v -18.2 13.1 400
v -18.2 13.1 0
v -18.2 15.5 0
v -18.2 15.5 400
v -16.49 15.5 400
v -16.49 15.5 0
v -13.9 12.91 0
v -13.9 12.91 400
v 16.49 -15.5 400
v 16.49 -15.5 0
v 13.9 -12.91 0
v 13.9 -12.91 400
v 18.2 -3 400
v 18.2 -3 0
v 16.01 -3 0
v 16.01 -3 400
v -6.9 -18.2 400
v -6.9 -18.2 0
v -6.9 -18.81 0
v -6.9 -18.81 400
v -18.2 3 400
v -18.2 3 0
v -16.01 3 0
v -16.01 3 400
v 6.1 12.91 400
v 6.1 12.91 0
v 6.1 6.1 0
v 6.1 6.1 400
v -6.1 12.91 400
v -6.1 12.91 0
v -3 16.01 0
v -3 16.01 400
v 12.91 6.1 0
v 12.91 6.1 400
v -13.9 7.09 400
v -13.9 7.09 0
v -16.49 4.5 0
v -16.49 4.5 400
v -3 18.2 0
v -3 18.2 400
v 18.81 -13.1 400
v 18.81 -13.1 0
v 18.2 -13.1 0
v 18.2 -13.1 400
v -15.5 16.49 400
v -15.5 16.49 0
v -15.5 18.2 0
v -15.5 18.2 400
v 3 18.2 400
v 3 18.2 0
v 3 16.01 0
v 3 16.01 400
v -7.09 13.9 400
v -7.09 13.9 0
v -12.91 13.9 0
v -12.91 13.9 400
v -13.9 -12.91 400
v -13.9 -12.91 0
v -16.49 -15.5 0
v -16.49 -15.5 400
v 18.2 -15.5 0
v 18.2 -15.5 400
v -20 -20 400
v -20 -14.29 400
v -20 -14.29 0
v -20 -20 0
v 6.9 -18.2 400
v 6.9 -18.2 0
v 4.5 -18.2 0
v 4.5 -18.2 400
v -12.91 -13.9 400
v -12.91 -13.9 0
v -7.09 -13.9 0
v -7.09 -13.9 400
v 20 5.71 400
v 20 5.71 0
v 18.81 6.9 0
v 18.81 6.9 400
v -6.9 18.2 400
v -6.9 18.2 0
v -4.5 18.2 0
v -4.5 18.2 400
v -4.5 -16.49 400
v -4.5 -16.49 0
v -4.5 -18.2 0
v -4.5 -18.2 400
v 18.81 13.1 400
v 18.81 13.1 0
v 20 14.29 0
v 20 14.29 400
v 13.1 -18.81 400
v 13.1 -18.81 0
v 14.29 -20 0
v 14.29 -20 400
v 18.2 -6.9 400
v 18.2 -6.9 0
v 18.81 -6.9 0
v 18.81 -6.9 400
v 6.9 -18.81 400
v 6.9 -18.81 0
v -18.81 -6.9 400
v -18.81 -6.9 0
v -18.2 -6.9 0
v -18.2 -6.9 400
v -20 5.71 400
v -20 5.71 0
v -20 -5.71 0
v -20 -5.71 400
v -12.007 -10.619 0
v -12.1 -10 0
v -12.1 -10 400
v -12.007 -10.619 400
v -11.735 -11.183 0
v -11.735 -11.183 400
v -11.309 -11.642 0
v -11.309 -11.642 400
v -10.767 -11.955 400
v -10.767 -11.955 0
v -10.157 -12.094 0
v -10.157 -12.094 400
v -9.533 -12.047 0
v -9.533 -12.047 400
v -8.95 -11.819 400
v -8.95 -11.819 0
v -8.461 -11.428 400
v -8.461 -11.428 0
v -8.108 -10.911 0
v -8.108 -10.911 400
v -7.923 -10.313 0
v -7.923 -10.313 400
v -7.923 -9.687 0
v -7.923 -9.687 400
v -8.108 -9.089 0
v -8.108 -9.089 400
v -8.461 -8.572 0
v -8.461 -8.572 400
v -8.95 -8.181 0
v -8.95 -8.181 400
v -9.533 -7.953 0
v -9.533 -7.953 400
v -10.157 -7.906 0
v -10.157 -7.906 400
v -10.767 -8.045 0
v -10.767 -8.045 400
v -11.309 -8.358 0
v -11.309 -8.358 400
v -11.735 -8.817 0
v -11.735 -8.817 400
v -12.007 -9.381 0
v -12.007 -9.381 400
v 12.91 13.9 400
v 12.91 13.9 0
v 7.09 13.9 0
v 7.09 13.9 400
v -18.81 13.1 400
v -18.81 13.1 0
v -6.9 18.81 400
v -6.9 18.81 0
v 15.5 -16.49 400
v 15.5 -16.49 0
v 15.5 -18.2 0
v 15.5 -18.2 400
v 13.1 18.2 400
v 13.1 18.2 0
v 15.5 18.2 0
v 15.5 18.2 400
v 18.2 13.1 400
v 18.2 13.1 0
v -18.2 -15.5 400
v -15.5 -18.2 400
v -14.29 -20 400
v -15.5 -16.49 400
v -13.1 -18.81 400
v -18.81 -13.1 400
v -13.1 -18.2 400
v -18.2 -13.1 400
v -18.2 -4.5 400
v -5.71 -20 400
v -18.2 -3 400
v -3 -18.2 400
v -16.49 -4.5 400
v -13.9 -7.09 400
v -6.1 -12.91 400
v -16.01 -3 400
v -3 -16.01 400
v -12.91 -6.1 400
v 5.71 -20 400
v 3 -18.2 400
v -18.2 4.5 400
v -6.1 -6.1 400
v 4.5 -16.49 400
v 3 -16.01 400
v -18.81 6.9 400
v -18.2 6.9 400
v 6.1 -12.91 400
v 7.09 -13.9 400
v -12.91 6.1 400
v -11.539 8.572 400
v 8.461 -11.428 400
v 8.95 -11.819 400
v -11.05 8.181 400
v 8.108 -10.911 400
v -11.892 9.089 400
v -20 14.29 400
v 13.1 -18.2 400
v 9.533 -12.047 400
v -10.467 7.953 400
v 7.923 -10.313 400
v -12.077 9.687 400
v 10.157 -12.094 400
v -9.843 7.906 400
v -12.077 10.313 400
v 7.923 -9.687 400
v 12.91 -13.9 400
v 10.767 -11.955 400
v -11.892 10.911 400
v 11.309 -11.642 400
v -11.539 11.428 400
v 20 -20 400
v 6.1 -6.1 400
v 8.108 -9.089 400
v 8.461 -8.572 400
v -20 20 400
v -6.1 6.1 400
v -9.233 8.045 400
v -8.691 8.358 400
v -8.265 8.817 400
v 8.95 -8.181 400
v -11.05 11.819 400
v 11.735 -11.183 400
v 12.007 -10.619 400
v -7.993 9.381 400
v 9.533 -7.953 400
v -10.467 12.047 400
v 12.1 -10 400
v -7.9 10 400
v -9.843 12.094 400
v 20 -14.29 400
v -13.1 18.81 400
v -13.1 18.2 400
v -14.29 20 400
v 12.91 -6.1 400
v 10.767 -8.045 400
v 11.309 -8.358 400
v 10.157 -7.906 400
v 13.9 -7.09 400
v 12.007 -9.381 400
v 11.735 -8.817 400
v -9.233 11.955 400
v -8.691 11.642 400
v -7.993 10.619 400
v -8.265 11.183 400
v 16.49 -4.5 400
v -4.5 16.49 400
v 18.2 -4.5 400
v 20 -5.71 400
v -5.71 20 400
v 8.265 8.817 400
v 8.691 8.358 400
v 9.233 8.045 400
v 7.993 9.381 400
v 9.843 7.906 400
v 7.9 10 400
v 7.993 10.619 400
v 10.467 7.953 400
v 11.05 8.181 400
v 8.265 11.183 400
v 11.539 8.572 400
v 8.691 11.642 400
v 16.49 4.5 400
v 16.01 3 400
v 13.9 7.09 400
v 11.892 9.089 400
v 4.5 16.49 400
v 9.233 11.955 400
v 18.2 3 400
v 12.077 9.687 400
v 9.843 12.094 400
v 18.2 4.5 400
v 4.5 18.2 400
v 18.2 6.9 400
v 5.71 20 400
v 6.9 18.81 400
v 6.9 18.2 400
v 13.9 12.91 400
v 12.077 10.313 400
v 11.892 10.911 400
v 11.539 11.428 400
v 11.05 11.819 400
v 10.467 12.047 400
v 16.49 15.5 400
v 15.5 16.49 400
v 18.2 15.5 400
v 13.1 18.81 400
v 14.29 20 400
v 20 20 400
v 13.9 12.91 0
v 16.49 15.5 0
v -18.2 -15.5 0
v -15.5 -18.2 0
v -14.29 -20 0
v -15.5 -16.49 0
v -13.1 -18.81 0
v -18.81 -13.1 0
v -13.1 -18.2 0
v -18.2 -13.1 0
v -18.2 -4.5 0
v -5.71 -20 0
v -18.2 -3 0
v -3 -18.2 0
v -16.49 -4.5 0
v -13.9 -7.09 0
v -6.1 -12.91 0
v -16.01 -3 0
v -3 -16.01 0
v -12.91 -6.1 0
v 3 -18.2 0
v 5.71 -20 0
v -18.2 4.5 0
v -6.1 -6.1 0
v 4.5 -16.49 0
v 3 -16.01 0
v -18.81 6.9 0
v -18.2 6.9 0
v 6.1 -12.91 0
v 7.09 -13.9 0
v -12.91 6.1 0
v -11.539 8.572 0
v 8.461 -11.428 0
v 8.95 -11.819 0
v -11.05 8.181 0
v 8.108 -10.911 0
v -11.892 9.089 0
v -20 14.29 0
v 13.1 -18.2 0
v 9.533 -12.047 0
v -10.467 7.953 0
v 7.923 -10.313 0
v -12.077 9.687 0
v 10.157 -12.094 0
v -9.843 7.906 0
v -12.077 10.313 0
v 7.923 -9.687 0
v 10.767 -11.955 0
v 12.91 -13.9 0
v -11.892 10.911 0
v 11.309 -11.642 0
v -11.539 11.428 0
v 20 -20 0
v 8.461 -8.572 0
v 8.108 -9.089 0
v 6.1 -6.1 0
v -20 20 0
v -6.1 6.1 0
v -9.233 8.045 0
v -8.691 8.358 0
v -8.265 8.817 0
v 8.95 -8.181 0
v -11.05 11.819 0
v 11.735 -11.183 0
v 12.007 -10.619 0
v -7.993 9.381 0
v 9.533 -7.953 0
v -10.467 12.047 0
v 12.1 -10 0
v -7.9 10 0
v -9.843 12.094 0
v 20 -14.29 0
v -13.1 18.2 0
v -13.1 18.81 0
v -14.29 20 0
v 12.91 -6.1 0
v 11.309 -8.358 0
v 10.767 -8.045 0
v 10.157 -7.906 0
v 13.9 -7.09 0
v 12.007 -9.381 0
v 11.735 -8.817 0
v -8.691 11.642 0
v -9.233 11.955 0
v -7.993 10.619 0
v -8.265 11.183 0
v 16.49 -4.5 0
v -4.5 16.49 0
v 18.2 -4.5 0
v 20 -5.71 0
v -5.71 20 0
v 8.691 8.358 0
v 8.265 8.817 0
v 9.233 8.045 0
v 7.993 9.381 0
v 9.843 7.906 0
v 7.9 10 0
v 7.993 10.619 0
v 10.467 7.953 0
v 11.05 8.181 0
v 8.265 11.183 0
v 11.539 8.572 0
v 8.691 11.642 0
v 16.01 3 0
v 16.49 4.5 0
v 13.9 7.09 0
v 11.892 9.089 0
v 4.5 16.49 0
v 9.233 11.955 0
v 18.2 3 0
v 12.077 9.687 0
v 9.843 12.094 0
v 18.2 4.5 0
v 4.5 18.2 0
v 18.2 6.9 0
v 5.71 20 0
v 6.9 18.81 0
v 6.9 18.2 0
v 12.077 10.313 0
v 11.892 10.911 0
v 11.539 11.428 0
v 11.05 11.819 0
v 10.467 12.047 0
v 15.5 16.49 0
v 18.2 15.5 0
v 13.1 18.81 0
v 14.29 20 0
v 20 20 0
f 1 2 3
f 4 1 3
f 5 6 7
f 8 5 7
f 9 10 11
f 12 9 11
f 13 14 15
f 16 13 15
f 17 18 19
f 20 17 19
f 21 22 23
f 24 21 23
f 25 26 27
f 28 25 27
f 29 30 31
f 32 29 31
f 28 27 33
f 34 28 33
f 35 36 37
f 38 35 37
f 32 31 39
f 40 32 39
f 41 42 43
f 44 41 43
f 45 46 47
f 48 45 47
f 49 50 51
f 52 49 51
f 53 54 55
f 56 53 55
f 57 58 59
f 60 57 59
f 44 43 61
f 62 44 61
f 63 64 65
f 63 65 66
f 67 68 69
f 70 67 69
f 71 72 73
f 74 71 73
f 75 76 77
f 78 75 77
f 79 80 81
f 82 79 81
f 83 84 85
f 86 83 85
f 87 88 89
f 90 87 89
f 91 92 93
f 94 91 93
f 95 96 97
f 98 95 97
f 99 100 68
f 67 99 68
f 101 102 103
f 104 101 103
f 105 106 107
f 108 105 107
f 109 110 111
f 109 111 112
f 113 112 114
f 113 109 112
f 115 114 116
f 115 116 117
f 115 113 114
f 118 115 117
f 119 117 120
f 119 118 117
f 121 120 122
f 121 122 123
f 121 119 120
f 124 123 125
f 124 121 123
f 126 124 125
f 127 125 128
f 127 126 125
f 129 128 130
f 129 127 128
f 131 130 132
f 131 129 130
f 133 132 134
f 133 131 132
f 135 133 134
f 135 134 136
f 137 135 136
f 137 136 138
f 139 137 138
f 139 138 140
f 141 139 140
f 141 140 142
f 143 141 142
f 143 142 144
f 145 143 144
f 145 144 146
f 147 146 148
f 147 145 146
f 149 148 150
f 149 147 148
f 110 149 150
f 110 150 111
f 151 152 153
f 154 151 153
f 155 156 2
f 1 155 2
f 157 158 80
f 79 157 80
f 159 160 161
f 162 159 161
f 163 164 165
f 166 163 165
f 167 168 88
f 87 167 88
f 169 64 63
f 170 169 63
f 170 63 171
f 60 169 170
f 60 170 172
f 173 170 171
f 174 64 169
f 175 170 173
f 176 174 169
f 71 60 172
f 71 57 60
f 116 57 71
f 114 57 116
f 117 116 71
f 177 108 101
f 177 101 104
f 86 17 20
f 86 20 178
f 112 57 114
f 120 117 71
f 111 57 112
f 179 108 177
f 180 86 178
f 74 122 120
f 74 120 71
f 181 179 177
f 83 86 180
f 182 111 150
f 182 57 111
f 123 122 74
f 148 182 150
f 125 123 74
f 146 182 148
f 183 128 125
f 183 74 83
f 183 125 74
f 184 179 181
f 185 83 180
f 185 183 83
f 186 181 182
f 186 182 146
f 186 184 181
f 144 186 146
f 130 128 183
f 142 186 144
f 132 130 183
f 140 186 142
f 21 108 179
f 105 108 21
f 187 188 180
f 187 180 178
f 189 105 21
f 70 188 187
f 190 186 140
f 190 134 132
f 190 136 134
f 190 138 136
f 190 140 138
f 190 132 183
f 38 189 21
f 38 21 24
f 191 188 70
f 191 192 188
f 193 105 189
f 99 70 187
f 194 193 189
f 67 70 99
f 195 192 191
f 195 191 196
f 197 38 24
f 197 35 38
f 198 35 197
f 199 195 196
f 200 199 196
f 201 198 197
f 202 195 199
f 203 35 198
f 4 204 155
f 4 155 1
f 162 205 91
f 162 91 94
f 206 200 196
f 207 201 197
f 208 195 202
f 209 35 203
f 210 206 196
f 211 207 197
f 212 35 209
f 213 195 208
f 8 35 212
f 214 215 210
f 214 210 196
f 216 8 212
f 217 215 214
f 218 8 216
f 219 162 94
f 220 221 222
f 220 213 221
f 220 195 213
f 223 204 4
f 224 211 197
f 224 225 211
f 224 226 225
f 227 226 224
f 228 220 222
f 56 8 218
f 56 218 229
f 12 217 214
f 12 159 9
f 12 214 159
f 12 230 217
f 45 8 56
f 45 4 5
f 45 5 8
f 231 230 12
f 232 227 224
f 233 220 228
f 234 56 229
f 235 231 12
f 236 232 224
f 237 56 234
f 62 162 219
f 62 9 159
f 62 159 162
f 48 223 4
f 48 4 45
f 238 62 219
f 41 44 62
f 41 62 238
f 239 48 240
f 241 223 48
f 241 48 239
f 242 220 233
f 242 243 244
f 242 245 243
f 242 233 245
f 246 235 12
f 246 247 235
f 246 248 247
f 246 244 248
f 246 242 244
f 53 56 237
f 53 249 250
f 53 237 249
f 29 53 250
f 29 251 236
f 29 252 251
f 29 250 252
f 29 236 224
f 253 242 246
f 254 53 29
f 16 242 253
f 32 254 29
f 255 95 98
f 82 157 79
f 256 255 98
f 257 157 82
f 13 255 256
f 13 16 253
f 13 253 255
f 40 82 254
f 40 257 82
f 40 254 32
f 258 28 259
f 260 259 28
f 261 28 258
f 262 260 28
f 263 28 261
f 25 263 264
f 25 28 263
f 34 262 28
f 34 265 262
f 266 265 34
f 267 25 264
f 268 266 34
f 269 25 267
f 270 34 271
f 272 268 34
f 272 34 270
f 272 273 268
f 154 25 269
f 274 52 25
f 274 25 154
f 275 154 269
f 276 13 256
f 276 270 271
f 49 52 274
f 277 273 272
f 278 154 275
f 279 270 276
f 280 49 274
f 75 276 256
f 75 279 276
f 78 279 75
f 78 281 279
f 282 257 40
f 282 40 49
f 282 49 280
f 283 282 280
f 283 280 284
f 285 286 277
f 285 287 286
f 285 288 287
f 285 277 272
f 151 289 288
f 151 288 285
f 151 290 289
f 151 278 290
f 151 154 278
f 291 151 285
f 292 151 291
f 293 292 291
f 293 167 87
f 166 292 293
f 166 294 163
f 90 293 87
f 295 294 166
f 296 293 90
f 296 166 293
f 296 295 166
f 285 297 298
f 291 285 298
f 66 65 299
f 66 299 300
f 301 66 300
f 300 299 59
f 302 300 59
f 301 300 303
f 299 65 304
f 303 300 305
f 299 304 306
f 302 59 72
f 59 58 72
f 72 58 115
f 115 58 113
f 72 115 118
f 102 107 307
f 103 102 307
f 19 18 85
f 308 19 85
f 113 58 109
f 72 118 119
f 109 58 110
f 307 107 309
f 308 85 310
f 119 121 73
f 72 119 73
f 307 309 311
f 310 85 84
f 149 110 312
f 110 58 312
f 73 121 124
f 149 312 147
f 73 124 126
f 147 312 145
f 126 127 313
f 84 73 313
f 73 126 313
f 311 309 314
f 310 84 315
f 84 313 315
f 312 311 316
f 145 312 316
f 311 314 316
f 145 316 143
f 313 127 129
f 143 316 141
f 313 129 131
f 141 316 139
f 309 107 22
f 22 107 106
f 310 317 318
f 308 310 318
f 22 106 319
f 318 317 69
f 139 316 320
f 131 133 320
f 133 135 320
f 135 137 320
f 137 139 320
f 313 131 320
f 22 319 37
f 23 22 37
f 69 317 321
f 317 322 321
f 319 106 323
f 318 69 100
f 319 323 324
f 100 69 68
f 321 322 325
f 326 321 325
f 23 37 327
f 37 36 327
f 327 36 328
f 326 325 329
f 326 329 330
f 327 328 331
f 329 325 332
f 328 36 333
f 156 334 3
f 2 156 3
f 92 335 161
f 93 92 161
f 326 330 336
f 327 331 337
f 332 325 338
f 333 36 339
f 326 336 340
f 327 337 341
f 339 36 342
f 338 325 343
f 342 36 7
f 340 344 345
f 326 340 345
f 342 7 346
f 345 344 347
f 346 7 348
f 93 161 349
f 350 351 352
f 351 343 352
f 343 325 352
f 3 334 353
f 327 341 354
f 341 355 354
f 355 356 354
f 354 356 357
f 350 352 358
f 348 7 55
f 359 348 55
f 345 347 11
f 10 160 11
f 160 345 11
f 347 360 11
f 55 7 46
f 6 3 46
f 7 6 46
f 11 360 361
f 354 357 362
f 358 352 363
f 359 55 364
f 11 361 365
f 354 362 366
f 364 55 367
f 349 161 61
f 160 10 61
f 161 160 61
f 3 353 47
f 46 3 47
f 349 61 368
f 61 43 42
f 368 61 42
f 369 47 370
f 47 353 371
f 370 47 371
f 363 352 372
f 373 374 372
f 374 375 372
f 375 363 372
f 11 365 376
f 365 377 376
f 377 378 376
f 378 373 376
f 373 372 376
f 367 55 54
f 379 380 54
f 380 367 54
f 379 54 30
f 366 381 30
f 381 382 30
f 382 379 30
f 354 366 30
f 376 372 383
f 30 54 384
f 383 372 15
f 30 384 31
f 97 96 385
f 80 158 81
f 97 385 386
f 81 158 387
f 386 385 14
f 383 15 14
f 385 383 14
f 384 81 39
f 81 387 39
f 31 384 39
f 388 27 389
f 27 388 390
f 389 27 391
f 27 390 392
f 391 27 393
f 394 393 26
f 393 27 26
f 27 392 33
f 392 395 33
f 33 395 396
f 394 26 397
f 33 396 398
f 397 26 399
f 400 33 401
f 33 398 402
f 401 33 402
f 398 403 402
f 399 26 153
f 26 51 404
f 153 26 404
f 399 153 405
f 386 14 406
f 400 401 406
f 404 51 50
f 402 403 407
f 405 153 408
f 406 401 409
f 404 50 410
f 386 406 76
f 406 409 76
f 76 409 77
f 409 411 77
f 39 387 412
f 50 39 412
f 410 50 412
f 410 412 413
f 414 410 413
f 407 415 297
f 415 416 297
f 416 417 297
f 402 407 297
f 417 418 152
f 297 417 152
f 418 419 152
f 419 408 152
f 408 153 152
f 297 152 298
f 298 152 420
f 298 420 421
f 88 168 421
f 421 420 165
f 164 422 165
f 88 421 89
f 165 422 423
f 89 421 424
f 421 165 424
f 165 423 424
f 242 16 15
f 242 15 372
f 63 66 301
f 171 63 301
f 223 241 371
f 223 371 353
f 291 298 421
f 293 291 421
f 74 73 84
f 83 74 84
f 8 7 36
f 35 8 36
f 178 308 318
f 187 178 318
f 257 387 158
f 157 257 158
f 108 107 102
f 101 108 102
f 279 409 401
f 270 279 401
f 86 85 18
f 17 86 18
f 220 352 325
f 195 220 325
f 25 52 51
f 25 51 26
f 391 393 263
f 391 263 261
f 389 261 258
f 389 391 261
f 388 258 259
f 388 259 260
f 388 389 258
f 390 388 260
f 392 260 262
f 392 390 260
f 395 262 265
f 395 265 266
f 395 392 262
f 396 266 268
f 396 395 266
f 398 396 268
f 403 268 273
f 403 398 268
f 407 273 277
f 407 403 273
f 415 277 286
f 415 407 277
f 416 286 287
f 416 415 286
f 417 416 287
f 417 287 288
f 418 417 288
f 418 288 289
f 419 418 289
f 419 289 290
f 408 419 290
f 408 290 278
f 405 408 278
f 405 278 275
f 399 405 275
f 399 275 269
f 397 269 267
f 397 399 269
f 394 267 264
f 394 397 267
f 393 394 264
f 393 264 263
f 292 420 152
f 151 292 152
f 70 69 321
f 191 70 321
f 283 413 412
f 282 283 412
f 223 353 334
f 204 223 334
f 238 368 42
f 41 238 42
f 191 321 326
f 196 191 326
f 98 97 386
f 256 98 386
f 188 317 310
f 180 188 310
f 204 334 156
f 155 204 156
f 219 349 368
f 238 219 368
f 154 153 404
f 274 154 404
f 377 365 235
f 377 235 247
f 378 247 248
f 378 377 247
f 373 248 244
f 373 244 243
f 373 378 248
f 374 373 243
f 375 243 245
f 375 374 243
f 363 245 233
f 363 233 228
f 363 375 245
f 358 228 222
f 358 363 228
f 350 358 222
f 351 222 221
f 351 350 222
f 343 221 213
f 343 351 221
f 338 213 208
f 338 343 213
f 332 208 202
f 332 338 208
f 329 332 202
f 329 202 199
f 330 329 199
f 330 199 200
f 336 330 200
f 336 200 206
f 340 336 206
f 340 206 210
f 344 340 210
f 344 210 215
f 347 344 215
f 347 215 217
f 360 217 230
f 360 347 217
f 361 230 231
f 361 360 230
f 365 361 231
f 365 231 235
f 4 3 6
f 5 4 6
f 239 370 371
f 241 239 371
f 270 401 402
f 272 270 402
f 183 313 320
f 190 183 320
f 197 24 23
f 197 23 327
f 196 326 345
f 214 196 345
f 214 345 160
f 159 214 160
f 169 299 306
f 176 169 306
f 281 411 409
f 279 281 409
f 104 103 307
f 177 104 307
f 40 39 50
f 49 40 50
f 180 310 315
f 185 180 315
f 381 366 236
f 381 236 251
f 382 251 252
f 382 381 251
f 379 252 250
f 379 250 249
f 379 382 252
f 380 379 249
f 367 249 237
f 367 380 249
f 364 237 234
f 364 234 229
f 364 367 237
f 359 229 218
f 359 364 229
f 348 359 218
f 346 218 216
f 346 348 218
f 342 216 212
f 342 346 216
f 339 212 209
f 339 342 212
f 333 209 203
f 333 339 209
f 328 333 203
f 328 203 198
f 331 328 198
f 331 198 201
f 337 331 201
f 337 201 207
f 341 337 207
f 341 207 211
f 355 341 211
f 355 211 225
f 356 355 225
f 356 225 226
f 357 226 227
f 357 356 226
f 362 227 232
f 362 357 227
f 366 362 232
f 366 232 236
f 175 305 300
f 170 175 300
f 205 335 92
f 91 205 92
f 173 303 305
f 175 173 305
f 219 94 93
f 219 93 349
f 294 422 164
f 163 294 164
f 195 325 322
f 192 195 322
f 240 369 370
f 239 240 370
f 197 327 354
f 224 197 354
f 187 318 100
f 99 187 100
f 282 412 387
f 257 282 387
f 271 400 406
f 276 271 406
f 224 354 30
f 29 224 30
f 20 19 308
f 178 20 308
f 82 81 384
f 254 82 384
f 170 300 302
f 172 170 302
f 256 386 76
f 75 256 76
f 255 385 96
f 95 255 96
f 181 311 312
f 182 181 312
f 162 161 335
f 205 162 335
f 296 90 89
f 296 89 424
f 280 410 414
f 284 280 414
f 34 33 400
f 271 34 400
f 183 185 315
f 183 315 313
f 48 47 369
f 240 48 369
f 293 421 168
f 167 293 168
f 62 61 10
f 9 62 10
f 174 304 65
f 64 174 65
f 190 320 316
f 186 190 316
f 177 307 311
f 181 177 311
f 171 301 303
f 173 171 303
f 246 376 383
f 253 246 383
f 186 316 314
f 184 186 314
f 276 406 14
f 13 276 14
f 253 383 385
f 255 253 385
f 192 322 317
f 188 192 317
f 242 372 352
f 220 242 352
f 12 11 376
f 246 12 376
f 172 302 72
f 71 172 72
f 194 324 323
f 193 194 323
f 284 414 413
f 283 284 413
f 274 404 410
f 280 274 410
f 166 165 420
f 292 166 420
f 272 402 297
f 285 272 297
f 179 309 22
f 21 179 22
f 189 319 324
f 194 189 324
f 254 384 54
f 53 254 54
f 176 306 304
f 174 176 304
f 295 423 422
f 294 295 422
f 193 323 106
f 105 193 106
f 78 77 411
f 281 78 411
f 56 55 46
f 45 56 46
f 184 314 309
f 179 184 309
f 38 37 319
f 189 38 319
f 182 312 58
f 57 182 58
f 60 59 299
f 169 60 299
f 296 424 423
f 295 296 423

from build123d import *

# Parameters (mm, degrees)
SKETCH_1_R      = 2.1
EXTRUDE_1_DEPTH = 400


with BuildPart() as part:
    # 草图1 → 凸台-拉伸1 (new body)
    with BuildSketch(Plane.XY):
        Polygon((5.71, 20), (-5.71, 20), (-6.9, 18.81), (-6.9, 18.2), (-4.5, 18.2), (-4.5, 16.489949494), (-7.089949494, 13.9), (-12.910050506, 13.9), (-15.5, 16.489949494), (-15.5, 18.2), (-13.1, 18.2), (-13.1, 18.81), (-14.29, 20), (-20, 20), (-20, 14.29), (-18.81, 13.1), (-18.2, 13.1), (-18.2, 15.5), (-16.489949494, 15.5), (-13.9, 12.910050506), (-13.9, 7.089949494), (-16.489949494, 4.5), (-18.2, 4.5), (-18.2, 6.9), (-18.81, 6.9), (-20, 5.71), (-20, -5.71), (-18.81, -6.9), (-18.2, -6.9), (-18.2, -4.5), (-16.489949494, -4.5), (-13.9, -7.089949494), (-13.9, -12.910050506), (-16.489949494, -15.5), (-18.2, -15.5), (-18.2, -13.1), (-18.81, -13.1), (-20, -14.29), (-20, -20), (-14.29, -20), (-13.1, -18.81), (-13.1, -18.2), (-15.5, -18.2), (-15.5, -16.489949494), (-12.910050506, -13.9), (-7.089949494, -13.9), (-4.5, -16.489949494), (-4.5, -18.2), (-6.9, -18.2), (-6.9, -18.81), (-5.71, -20), (5.71, -20), (6.9, -18.81), (6.9, -18.2), (4.5, -18.2), (4.5, -16.489949494), (7.089949494, -13.9), (12.910050506, -13.9), (15.5, -16.489949494), (15.5, -18.2), (13.1, -18.2), (13.1, -18.81), (14.29, -20), (20, -20), (20, -14.29), (18.81, -13.1), (18.2, -13.1), (18.2, -15.5), (16.489949494, -15.5), (13.9, -12.910050506), (13.9, -7.089949494), (16.489949494, -4.5), (18.2, -4.5), (18.2, -6.9), (18.81, -6.9), (20, -5.71), (20, 5.71), (18.81, 6.9), (18.2, 6.9), (18.2, 4.5), (16.489949494, 4.5), (13.9, 7.089949494), (13.9, 12.910050506), (16.489949494, 15.5), (18.2, 15.5), (18.2, 13.1), (18.81, 13.1), (20, 14.29), (20, 20), (14.29, 20), (13.1, 18.81), (13.1, 18.2), (15.5, 18.2), (15.5, 16.489949494), (12.910050506, 13.9), (7.089949494, 13.9), (4.5, 16.489949494), (4.5, 18.2), (6.9, 18.2), (6.9, 18.81), align=None)
        with Locations((-10, 10)):
            Circle(SKETCH_1_R, mode=Mode.SUBTRACT)
        with Locations(Location((-10, -10, 0), (0, 0, 180))):
            Circle(SKETCH_1_R, mode=Mode.SUBTRACT)
        with Locations((10, -10)):
            Circle(SKETCH_1_R, mode=Mode.SUBTRACT)
        with Locations(Location((10, 10, 0), (0, 0, 180))):
            Circle(SKETCH_1_R, mode=Mode.SUBTRACT)
        Polygon((-6.1, 6.1), (-6.1, 12.910050506), (-3, 16.010050506), (-3, 18.2), (3, 18.2), (3, 16.010050506), (6.1, 12.910050506), (6.1, 6.1), (12.910050506, 6.1), (16.010050506, 3), (18.2, 3), (18.2, -3), (16.010050506, -3), (12.910050506, -6.1), (6.1, -6.1), (6.1, -12.910050506), (3, -16.010050506), (3, -18.2), (-3, -18.2), (-3, -16.010050506), (-6.1, -12.910050506), (-6.1, -6.1), (-12.910050506, -6.1), (-16.010050506, -3), (-18.2, -3), (-18.2, 3), (-16.010050506, 3), (-12.910050506, 6.1), align=None, mode=Mode.SUBTRACT)
    extrude(amount=EXTRUDE_1_DEPTH)


solid = part.part
